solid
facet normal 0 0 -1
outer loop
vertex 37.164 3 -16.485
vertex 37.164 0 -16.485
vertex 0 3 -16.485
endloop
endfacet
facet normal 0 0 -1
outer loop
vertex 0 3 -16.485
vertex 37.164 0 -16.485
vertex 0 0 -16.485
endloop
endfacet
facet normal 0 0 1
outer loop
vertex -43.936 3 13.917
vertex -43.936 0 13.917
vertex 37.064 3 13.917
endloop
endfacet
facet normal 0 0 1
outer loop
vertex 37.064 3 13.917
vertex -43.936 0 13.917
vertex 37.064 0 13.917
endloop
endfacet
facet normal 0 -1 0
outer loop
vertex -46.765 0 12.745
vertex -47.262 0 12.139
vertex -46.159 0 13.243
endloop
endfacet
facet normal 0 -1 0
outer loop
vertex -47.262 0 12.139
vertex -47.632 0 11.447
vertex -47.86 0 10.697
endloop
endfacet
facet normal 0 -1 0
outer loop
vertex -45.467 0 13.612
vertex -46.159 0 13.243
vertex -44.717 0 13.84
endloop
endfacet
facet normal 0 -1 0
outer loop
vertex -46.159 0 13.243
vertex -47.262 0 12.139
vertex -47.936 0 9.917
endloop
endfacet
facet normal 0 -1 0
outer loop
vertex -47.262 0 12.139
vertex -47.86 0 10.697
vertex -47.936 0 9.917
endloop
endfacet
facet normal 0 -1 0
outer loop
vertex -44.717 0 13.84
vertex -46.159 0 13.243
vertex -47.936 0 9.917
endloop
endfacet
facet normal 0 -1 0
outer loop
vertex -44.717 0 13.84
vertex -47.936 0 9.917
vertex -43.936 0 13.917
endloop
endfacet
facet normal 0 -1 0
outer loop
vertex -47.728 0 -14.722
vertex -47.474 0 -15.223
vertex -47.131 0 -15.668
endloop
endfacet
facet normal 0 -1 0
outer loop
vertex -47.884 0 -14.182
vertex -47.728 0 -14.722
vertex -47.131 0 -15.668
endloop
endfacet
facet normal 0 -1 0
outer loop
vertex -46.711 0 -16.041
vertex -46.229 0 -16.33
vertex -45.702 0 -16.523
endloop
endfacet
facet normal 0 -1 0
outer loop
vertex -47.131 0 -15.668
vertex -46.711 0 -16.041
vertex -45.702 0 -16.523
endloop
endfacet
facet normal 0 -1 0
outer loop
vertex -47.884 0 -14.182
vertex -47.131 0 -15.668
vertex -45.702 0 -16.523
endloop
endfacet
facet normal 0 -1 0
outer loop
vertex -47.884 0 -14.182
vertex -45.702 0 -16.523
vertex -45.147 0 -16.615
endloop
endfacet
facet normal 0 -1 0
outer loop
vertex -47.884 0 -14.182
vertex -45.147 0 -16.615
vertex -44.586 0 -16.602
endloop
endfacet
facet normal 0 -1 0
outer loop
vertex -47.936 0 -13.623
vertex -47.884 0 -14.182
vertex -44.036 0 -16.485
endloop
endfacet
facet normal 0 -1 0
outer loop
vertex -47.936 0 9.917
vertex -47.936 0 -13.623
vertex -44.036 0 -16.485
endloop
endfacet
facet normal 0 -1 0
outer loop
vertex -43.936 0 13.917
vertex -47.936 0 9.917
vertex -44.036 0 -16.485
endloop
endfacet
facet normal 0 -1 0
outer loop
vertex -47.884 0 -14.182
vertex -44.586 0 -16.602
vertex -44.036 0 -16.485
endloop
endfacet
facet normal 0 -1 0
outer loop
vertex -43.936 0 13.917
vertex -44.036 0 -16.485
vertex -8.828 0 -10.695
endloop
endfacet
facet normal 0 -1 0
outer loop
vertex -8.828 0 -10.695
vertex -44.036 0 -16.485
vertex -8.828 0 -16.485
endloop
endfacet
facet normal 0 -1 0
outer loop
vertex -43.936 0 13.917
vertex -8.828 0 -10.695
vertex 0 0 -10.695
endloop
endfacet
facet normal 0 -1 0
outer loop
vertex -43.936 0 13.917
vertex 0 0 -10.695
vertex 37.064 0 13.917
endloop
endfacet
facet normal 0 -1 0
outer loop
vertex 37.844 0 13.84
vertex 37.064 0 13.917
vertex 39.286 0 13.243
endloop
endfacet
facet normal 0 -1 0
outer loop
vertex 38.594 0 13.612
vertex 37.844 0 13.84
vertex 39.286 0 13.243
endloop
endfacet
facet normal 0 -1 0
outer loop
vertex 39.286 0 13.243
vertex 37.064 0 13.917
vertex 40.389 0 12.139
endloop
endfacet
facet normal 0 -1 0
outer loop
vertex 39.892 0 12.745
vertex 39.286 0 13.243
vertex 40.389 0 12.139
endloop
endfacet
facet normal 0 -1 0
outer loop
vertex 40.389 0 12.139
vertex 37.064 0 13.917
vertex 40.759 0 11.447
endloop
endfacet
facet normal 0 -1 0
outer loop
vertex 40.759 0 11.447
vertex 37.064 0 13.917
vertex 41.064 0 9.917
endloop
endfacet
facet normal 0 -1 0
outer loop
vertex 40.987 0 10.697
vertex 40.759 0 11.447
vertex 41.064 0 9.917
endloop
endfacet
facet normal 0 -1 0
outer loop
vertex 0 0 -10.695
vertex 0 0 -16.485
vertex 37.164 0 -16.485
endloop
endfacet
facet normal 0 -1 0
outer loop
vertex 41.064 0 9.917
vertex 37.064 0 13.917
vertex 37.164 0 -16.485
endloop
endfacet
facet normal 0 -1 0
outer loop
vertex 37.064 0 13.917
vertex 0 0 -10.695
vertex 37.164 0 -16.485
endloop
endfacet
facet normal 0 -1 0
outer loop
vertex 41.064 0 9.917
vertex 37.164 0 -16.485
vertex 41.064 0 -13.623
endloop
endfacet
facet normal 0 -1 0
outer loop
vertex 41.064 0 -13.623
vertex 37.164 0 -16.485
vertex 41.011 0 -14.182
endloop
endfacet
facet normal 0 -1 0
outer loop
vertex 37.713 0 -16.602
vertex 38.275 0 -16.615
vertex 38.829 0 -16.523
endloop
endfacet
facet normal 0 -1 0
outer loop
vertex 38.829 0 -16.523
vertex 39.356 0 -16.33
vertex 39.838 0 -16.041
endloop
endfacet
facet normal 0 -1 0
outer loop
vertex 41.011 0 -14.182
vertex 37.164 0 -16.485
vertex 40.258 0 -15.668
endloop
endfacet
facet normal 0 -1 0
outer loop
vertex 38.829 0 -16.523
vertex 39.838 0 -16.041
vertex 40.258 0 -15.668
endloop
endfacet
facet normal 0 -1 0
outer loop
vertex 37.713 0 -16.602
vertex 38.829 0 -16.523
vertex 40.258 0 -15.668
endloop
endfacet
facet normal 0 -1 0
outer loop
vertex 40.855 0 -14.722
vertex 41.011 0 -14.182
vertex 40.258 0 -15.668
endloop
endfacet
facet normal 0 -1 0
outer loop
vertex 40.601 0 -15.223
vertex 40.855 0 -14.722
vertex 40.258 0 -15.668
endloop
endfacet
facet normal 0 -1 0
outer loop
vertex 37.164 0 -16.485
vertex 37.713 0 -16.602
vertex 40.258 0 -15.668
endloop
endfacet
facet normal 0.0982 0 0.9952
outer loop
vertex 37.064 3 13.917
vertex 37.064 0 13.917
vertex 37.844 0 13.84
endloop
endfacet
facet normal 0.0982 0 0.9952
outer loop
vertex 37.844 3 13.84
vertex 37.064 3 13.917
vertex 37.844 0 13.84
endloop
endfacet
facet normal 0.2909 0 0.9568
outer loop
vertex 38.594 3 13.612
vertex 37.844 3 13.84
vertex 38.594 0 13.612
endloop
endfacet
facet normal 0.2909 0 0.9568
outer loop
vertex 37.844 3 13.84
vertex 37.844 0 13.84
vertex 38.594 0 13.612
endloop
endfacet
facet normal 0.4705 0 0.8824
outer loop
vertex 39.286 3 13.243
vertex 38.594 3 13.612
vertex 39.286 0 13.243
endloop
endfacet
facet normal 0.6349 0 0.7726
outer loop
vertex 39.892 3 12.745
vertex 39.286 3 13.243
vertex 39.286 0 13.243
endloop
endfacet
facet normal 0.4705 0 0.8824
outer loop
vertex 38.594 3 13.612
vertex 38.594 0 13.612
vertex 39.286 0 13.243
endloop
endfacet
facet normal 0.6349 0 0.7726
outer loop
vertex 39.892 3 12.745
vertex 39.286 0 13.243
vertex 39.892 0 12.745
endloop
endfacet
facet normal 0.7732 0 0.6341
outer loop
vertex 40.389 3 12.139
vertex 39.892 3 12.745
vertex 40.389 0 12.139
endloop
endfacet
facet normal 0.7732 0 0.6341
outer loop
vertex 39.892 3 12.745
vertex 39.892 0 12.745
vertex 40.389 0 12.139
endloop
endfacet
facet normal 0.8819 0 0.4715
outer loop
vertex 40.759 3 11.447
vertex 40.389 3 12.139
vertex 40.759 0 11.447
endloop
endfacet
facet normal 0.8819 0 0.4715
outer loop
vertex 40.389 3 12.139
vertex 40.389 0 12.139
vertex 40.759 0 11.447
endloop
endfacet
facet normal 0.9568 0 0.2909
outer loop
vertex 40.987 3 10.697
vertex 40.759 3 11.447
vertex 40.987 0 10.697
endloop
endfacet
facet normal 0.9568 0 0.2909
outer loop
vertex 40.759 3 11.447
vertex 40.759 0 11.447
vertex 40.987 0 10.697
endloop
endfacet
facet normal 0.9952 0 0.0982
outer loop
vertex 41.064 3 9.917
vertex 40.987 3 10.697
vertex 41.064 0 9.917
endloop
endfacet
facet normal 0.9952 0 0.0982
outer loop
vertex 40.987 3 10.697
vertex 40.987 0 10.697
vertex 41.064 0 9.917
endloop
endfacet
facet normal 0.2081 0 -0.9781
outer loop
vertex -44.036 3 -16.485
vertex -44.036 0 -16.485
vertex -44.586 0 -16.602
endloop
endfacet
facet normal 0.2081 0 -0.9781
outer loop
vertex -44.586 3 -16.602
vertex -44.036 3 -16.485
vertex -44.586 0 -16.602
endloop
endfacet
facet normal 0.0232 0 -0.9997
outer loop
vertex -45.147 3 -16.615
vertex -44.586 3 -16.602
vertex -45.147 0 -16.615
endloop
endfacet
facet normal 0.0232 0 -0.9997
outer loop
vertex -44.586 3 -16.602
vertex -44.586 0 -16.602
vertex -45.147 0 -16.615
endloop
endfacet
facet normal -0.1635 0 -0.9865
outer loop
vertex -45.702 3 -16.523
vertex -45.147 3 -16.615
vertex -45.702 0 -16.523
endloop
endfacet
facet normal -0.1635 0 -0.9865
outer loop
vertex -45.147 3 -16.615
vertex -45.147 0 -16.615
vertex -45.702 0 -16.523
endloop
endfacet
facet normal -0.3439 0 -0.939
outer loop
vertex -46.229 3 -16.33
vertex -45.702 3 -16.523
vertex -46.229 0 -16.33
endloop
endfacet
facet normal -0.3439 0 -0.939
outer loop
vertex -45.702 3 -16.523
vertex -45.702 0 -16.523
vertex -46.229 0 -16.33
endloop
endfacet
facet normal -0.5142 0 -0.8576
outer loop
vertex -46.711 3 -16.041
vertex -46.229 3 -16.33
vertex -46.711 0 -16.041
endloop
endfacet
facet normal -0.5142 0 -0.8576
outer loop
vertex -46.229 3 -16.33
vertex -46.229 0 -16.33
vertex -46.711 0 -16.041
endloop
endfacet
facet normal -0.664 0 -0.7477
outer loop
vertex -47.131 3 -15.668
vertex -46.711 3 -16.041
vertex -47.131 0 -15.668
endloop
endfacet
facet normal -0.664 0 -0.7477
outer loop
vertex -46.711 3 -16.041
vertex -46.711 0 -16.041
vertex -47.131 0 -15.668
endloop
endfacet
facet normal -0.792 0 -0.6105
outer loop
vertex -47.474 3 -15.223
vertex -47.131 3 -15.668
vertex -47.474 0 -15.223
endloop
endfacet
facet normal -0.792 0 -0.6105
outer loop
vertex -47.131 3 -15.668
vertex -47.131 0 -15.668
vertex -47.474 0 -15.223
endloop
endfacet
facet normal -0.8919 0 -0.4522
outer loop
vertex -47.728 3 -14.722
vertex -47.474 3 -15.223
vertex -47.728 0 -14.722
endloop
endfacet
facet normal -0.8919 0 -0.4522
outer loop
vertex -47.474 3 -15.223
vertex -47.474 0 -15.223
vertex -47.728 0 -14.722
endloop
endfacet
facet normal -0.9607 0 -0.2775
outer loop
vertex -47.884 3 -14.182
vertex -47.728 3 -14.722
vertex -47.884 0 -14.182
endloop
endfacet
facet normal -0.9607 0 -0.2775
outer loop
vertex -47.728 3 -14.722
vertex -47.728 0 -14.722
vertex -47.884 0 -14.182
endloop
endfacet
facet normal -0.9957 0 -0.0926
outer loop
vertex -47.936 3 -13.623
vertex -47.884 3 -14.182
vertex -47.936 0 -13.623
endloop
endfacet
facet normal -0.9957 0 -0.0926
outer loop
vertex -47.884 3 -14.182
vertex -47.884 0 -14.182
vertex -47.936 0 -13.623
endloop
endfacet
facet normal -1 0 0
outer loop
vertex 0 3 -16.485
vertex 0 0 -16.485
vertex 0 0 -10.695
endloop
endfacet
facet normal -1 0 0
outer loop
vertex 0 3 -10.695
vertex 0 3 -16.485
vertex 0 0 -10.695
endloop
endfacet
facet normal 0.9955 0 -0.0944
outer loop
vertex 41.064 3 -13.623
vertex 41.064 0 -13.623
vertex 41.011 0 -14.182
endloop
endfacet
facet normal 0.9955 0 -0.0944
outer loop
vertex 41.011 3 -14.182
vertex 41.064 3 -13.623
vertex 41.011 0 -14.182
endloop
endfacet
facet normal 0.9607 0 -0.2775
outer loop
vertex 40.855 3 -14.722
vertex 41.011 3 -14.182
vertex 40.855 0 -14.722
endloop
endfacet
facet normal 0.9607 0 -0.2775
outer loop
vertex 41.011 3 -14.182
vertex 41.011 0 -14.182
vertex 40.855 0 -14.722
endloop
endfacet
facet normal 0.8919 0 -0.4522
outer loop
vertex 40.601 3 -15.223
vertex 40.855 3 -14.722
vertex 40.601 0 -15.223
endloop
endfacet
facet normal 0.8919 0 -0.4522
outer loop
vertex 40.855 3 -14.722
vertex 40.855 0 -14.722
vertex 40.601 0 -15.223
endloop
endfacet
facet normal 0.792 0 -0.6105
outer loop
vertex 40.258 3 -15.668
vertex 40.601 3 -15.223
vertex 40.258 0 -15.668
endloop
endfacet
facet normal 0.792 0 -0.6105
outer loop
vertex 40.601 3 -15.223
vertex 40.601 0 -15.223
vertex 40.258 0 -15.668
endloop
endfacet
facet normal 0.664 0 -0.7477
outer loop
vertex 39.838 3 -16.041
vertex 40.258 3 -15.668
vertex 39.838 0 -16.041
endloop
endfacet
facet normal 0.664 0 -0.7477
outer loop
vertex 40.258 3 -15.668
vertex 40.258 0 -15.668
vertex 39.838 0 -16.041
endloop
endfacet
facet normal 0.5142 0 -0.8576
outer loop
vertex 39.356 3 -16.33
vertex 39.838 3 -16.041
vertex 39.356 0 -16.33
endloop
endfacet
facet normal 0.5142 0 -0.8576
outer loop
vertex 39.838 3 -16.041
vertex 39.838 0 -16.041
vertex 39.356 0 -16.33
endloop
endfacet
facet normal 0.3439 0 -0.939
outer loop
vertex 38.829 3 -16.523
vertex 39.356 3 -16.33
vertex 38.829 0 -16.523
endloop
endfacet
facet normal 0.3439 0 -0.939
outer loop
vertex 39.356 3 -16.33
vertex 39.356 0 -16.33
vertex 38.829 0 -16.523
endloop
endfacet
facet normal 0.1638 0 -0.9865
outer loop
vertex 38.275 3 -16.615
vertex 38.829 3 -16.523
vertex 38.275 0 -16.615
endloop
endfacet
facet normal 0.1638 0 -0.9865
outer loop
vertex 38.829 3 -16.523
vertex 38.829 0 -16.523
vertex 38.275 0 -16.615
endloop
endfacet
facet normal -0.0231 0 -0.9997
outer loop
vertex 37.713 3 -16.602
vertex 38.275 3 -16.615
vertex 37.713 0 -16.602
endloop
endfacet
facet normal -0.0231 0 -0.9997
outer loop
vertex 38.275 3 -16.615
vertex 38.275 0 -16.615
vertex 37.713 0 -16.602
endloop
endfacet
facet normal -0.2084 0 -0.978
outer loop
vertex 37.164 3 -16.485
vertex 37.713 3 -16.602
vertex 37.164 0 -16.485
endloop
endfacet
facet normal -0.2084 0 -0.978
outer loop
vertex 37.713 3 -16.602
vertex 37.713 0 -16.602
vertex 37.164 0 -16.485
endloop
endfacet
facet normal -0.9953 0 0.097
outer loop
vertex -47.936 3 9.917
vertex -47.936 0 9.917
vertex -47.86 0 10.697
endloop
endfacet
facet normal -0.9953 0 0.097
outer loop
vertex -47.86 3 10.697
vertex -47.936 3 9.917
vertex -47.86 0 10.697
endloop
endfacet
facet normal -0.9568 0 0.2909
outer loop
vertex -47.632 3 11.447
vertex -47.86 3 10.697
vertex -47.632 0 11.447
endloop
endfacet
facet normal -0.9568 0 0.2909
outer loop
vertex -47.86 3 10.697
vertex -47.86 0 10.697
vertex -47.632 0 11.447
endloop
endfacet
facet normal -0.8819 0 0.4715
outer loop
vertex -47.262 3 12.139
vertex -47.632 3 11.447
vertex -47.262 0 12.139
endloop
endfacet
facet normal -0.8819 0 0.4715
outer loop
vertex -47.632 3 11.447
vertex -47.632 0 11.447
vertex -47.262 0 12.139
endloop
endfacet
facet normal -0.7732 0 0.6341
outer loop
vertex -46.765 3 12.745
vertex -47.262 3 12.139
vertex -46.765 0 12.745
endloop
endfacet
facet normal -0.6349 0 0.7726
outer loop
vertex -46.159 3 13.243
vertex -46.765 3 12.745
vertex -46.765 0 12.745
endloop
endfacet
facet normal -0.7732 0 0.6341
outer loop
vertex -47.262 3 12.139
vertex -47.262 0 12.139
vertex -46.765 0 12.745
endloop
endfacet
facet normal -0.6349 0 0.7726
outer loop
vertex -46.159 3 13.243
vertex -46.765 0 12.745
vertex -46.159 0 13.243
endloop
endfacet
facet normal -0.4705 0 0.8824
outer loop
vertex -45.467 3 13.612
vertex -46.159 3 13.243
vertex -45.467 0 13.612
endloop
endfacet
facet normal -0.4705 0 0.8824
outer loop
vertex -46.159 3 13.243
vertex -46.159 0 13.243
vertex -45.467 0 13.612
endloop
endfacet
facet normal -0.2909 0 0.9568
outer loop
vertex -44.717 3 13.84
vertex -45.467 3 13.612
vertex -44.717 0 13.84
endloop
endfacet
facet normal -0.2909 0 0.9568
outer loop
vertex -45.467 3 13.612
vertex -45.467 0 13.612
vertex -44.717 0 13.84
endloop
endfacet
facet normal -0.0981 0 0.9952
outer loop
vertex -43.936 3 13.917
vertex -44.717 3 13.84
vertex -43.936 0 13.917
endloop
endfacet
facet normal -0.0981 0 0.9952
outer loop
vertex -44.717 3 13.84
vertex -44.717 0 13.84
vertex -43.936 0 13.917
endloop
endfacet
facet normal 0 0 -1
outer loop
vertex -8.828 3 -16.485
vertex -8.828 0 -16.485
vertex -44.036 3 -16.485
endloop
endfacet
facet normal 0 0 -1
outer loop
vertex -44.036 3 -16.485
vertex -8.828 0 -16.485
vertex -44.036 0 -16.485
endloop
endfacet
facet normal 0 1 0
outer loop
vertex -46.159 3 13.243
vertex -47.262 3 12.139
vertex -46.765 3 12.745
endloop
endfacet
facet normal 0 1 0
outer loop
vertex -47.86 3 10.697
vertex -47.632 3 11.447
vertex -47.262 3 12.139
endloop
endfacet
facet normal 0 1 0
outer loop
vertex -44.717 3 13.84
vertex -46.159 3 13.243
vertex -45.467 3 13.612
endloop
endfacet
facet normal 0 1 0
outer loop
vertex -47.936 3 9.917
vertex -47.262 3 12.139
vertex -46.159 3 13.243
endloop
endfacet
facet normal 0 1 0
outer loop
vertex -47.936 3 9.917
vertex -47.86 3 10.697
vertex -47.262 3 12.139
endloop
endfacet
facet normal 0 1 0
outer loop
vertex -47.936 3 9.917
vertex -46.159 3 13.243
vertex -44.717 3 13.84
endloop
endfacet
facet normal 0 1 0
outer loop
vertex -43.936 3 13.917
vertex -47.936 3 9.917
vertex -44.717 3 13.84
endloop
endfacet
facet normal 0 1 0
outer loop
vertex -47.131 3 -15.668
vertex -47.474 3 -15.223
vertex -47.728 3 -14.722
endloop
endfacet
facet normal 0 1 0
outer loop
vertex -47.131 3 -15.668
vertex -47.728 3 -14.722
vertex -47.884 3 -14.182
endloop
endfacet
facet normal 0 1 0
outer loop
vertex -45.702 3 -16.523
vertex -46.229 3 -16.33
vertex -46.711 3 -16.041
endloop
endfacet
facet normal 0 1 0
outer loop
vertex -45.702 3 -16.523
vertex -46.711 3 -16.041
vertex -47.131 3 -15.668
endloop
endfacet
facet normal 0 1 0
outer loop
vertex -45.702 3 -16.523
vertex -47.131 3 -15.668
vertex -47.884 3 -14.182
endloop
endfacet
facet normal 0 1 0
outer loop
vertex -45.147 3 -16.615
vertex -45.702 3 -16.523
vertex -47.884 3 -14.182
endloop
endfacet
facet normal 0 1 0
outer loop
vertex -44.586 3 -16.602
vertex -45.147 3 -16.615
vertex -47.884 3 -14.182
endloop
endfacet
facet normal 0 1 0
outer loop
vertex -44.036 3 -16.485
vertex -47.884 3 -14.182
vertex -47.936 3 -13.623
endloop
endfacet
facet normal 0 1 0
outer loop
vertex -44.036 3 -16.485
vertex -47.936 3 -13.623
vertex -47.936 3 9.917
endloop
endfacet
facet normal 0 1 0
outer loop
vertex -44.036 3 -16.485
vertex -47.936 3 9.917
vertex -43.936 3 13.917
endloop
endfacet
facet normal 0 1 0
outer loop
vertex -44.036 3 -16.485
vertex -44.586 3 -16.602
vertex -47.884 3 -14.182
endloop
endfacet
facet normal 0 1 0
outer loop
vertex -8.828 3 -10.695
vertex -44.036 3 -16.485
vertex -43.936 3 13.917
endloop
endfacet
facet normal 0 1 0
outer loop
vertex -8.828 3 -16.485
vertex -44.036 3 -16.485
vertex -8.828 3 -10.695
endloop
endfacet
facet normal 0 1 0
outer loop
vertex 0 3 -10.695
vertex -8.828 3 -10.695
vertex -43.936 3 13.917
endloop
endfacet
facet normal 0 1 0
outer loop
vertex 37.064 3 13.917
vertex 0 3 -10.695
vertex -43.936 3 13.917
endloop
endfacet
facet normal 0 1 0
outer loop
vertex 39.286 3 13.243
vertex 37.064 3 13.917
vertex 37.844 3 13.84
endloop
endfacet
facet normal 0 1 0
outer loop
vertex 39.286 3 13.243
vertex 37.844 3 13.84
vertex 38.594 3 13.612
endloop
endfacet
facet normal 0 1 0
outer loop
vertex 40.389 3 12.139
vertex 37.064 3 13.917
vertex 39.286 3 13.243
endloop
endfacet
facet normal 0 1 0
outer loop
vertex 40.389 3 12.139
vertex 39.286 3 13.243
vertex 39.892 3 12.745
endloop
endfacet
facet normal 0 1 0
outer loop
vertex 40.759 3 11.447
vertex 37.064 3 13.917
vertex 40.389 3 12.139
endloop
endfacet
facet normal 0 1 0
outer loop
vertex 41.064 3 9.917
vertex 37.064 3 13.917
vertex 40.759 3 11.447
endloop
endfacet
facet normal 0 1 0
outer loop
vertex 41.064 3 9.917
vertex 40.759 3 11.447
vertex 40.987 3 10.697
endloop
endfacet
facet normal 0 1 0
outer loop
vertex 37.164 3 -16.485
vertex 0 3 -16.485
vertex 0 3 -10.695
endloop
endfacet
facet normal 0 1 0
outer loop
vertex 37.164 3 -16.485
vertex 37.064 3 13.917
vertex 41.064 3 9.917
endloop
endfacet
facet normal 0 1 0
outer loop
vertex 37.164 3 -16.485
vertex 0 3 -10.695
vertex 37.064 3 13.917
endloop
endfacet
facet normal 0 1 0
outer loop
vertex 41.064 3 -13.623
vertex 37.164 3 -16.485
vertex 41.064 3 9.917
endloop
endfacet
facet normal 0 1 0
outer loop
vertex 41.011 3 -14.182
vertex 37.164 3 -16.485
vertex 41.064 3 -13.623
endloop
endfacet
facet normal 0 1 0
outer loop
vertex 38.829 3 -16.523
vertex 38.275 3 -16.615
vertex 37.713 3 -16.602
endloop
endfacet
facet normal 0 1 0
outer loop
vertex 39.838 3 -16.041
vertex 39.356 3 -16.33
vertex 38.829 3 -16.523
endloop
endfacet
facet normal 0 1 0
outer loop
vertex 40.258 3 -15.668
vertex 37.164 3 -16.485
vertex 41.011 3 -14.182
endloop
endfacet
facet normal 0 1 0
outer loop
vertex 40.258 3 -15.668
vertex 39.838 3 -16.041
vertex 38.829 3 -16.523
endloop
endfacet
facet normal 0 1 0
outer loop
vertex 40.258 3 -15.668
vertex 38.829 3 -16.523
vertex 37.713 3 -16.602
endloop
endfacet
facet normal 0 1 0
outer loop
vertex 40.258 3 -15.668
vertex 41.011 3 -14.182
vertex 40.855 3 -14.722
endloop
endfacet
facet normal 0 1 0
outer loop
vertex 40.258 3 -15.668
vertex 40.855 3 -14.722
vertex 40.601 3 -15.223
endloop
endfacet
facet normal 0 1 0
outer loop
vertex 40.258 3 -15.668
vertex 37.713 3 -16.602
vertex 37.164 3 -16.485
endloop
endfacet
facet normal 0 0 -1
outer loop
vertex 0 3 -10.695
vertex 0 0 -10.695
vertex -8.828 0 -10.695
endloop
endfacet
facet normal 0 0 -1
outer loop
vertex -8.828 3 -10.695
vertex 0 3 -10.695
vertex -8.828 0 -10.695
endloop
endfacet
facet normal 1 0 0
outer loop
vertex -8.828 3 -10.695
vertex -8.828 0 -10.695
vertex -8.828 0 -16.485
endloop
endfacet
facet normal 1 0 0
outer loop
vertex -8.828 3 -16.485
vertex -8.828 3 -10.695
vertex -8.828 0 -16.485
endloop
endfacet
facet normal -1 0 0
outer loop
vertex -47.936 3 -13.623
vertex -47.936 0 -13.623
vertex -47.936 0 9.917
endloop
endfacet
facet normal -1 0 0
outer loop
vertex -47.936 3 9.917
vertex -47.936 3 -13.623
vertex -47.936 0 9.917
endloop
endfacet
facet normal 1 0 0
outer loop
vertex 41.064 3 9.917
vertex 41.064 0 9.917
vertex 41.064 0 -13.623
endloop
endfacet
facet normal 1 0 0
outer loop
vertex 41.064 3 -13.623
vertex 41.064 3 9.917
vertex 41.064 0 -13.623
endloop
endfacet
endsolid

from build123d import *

# Parameters (mm, degrees)
RESSALTO_EXTRUS_O1_DEPTH = 3


with BuildPart() as part:
    # Esboço1 → Ressalto-extrusão1 (new body)
    with BuildSketch(Plane(origin=(0, 0, 0), x_dir=(1, 0, 0), z_dir=(0, 1, 0))):
        with BuildLine():
            Line((37.16356961, 16.484544918), (0, 16.484544918))
            Line((0, 16.484544918), (0, 10.69506871))
            Line((0, 10.69506871), (-8.827691361, 10.69506871))
            Line((-8.827691361, 10.69506871), (-8.827691361, 16.484544918))
            Line((-8.827691361, 16.484544918), (-44.03643039, 16.484544918))
            ThreePointArc((-44.03643039, 16.484544918), (-46.711254325, 16.041404638), (-47.93643039, 13.622727314))
            Line((-47.93643039, 13.622727314), (-47.93643039, 4.0833353))
            Line((-47.93643039, 4.0833353), (-47.93643039, -9.9166647))
            ThreePointArc((-47.93643039, -9.9166647), (-46.764857515, -12.745091825), (-43.93643039, -13.9166647))
            Line((-43.93643039, -13.9166647), (37.06356961, -13.9166647))
            ThreePointArc((37.06356961, -13.9166647), (39.891996735, -12.745091825), (41.06356961, -9.9166647))
            Line((41.06356961, -9.9166647), (41.06356961, 4.0833353))
            Line((41.06356961, 4.0833353), (41.06356961, 13.622727314))
            ThreePointArc((41.06356961, 13.622727314), (39.838393545, 16.041404638), (37.16356961, 16.484544918))
        make_face()
    extrude(amount=RESSALTO_EXTRUS_O1_DEPTH)


solid = part.part
